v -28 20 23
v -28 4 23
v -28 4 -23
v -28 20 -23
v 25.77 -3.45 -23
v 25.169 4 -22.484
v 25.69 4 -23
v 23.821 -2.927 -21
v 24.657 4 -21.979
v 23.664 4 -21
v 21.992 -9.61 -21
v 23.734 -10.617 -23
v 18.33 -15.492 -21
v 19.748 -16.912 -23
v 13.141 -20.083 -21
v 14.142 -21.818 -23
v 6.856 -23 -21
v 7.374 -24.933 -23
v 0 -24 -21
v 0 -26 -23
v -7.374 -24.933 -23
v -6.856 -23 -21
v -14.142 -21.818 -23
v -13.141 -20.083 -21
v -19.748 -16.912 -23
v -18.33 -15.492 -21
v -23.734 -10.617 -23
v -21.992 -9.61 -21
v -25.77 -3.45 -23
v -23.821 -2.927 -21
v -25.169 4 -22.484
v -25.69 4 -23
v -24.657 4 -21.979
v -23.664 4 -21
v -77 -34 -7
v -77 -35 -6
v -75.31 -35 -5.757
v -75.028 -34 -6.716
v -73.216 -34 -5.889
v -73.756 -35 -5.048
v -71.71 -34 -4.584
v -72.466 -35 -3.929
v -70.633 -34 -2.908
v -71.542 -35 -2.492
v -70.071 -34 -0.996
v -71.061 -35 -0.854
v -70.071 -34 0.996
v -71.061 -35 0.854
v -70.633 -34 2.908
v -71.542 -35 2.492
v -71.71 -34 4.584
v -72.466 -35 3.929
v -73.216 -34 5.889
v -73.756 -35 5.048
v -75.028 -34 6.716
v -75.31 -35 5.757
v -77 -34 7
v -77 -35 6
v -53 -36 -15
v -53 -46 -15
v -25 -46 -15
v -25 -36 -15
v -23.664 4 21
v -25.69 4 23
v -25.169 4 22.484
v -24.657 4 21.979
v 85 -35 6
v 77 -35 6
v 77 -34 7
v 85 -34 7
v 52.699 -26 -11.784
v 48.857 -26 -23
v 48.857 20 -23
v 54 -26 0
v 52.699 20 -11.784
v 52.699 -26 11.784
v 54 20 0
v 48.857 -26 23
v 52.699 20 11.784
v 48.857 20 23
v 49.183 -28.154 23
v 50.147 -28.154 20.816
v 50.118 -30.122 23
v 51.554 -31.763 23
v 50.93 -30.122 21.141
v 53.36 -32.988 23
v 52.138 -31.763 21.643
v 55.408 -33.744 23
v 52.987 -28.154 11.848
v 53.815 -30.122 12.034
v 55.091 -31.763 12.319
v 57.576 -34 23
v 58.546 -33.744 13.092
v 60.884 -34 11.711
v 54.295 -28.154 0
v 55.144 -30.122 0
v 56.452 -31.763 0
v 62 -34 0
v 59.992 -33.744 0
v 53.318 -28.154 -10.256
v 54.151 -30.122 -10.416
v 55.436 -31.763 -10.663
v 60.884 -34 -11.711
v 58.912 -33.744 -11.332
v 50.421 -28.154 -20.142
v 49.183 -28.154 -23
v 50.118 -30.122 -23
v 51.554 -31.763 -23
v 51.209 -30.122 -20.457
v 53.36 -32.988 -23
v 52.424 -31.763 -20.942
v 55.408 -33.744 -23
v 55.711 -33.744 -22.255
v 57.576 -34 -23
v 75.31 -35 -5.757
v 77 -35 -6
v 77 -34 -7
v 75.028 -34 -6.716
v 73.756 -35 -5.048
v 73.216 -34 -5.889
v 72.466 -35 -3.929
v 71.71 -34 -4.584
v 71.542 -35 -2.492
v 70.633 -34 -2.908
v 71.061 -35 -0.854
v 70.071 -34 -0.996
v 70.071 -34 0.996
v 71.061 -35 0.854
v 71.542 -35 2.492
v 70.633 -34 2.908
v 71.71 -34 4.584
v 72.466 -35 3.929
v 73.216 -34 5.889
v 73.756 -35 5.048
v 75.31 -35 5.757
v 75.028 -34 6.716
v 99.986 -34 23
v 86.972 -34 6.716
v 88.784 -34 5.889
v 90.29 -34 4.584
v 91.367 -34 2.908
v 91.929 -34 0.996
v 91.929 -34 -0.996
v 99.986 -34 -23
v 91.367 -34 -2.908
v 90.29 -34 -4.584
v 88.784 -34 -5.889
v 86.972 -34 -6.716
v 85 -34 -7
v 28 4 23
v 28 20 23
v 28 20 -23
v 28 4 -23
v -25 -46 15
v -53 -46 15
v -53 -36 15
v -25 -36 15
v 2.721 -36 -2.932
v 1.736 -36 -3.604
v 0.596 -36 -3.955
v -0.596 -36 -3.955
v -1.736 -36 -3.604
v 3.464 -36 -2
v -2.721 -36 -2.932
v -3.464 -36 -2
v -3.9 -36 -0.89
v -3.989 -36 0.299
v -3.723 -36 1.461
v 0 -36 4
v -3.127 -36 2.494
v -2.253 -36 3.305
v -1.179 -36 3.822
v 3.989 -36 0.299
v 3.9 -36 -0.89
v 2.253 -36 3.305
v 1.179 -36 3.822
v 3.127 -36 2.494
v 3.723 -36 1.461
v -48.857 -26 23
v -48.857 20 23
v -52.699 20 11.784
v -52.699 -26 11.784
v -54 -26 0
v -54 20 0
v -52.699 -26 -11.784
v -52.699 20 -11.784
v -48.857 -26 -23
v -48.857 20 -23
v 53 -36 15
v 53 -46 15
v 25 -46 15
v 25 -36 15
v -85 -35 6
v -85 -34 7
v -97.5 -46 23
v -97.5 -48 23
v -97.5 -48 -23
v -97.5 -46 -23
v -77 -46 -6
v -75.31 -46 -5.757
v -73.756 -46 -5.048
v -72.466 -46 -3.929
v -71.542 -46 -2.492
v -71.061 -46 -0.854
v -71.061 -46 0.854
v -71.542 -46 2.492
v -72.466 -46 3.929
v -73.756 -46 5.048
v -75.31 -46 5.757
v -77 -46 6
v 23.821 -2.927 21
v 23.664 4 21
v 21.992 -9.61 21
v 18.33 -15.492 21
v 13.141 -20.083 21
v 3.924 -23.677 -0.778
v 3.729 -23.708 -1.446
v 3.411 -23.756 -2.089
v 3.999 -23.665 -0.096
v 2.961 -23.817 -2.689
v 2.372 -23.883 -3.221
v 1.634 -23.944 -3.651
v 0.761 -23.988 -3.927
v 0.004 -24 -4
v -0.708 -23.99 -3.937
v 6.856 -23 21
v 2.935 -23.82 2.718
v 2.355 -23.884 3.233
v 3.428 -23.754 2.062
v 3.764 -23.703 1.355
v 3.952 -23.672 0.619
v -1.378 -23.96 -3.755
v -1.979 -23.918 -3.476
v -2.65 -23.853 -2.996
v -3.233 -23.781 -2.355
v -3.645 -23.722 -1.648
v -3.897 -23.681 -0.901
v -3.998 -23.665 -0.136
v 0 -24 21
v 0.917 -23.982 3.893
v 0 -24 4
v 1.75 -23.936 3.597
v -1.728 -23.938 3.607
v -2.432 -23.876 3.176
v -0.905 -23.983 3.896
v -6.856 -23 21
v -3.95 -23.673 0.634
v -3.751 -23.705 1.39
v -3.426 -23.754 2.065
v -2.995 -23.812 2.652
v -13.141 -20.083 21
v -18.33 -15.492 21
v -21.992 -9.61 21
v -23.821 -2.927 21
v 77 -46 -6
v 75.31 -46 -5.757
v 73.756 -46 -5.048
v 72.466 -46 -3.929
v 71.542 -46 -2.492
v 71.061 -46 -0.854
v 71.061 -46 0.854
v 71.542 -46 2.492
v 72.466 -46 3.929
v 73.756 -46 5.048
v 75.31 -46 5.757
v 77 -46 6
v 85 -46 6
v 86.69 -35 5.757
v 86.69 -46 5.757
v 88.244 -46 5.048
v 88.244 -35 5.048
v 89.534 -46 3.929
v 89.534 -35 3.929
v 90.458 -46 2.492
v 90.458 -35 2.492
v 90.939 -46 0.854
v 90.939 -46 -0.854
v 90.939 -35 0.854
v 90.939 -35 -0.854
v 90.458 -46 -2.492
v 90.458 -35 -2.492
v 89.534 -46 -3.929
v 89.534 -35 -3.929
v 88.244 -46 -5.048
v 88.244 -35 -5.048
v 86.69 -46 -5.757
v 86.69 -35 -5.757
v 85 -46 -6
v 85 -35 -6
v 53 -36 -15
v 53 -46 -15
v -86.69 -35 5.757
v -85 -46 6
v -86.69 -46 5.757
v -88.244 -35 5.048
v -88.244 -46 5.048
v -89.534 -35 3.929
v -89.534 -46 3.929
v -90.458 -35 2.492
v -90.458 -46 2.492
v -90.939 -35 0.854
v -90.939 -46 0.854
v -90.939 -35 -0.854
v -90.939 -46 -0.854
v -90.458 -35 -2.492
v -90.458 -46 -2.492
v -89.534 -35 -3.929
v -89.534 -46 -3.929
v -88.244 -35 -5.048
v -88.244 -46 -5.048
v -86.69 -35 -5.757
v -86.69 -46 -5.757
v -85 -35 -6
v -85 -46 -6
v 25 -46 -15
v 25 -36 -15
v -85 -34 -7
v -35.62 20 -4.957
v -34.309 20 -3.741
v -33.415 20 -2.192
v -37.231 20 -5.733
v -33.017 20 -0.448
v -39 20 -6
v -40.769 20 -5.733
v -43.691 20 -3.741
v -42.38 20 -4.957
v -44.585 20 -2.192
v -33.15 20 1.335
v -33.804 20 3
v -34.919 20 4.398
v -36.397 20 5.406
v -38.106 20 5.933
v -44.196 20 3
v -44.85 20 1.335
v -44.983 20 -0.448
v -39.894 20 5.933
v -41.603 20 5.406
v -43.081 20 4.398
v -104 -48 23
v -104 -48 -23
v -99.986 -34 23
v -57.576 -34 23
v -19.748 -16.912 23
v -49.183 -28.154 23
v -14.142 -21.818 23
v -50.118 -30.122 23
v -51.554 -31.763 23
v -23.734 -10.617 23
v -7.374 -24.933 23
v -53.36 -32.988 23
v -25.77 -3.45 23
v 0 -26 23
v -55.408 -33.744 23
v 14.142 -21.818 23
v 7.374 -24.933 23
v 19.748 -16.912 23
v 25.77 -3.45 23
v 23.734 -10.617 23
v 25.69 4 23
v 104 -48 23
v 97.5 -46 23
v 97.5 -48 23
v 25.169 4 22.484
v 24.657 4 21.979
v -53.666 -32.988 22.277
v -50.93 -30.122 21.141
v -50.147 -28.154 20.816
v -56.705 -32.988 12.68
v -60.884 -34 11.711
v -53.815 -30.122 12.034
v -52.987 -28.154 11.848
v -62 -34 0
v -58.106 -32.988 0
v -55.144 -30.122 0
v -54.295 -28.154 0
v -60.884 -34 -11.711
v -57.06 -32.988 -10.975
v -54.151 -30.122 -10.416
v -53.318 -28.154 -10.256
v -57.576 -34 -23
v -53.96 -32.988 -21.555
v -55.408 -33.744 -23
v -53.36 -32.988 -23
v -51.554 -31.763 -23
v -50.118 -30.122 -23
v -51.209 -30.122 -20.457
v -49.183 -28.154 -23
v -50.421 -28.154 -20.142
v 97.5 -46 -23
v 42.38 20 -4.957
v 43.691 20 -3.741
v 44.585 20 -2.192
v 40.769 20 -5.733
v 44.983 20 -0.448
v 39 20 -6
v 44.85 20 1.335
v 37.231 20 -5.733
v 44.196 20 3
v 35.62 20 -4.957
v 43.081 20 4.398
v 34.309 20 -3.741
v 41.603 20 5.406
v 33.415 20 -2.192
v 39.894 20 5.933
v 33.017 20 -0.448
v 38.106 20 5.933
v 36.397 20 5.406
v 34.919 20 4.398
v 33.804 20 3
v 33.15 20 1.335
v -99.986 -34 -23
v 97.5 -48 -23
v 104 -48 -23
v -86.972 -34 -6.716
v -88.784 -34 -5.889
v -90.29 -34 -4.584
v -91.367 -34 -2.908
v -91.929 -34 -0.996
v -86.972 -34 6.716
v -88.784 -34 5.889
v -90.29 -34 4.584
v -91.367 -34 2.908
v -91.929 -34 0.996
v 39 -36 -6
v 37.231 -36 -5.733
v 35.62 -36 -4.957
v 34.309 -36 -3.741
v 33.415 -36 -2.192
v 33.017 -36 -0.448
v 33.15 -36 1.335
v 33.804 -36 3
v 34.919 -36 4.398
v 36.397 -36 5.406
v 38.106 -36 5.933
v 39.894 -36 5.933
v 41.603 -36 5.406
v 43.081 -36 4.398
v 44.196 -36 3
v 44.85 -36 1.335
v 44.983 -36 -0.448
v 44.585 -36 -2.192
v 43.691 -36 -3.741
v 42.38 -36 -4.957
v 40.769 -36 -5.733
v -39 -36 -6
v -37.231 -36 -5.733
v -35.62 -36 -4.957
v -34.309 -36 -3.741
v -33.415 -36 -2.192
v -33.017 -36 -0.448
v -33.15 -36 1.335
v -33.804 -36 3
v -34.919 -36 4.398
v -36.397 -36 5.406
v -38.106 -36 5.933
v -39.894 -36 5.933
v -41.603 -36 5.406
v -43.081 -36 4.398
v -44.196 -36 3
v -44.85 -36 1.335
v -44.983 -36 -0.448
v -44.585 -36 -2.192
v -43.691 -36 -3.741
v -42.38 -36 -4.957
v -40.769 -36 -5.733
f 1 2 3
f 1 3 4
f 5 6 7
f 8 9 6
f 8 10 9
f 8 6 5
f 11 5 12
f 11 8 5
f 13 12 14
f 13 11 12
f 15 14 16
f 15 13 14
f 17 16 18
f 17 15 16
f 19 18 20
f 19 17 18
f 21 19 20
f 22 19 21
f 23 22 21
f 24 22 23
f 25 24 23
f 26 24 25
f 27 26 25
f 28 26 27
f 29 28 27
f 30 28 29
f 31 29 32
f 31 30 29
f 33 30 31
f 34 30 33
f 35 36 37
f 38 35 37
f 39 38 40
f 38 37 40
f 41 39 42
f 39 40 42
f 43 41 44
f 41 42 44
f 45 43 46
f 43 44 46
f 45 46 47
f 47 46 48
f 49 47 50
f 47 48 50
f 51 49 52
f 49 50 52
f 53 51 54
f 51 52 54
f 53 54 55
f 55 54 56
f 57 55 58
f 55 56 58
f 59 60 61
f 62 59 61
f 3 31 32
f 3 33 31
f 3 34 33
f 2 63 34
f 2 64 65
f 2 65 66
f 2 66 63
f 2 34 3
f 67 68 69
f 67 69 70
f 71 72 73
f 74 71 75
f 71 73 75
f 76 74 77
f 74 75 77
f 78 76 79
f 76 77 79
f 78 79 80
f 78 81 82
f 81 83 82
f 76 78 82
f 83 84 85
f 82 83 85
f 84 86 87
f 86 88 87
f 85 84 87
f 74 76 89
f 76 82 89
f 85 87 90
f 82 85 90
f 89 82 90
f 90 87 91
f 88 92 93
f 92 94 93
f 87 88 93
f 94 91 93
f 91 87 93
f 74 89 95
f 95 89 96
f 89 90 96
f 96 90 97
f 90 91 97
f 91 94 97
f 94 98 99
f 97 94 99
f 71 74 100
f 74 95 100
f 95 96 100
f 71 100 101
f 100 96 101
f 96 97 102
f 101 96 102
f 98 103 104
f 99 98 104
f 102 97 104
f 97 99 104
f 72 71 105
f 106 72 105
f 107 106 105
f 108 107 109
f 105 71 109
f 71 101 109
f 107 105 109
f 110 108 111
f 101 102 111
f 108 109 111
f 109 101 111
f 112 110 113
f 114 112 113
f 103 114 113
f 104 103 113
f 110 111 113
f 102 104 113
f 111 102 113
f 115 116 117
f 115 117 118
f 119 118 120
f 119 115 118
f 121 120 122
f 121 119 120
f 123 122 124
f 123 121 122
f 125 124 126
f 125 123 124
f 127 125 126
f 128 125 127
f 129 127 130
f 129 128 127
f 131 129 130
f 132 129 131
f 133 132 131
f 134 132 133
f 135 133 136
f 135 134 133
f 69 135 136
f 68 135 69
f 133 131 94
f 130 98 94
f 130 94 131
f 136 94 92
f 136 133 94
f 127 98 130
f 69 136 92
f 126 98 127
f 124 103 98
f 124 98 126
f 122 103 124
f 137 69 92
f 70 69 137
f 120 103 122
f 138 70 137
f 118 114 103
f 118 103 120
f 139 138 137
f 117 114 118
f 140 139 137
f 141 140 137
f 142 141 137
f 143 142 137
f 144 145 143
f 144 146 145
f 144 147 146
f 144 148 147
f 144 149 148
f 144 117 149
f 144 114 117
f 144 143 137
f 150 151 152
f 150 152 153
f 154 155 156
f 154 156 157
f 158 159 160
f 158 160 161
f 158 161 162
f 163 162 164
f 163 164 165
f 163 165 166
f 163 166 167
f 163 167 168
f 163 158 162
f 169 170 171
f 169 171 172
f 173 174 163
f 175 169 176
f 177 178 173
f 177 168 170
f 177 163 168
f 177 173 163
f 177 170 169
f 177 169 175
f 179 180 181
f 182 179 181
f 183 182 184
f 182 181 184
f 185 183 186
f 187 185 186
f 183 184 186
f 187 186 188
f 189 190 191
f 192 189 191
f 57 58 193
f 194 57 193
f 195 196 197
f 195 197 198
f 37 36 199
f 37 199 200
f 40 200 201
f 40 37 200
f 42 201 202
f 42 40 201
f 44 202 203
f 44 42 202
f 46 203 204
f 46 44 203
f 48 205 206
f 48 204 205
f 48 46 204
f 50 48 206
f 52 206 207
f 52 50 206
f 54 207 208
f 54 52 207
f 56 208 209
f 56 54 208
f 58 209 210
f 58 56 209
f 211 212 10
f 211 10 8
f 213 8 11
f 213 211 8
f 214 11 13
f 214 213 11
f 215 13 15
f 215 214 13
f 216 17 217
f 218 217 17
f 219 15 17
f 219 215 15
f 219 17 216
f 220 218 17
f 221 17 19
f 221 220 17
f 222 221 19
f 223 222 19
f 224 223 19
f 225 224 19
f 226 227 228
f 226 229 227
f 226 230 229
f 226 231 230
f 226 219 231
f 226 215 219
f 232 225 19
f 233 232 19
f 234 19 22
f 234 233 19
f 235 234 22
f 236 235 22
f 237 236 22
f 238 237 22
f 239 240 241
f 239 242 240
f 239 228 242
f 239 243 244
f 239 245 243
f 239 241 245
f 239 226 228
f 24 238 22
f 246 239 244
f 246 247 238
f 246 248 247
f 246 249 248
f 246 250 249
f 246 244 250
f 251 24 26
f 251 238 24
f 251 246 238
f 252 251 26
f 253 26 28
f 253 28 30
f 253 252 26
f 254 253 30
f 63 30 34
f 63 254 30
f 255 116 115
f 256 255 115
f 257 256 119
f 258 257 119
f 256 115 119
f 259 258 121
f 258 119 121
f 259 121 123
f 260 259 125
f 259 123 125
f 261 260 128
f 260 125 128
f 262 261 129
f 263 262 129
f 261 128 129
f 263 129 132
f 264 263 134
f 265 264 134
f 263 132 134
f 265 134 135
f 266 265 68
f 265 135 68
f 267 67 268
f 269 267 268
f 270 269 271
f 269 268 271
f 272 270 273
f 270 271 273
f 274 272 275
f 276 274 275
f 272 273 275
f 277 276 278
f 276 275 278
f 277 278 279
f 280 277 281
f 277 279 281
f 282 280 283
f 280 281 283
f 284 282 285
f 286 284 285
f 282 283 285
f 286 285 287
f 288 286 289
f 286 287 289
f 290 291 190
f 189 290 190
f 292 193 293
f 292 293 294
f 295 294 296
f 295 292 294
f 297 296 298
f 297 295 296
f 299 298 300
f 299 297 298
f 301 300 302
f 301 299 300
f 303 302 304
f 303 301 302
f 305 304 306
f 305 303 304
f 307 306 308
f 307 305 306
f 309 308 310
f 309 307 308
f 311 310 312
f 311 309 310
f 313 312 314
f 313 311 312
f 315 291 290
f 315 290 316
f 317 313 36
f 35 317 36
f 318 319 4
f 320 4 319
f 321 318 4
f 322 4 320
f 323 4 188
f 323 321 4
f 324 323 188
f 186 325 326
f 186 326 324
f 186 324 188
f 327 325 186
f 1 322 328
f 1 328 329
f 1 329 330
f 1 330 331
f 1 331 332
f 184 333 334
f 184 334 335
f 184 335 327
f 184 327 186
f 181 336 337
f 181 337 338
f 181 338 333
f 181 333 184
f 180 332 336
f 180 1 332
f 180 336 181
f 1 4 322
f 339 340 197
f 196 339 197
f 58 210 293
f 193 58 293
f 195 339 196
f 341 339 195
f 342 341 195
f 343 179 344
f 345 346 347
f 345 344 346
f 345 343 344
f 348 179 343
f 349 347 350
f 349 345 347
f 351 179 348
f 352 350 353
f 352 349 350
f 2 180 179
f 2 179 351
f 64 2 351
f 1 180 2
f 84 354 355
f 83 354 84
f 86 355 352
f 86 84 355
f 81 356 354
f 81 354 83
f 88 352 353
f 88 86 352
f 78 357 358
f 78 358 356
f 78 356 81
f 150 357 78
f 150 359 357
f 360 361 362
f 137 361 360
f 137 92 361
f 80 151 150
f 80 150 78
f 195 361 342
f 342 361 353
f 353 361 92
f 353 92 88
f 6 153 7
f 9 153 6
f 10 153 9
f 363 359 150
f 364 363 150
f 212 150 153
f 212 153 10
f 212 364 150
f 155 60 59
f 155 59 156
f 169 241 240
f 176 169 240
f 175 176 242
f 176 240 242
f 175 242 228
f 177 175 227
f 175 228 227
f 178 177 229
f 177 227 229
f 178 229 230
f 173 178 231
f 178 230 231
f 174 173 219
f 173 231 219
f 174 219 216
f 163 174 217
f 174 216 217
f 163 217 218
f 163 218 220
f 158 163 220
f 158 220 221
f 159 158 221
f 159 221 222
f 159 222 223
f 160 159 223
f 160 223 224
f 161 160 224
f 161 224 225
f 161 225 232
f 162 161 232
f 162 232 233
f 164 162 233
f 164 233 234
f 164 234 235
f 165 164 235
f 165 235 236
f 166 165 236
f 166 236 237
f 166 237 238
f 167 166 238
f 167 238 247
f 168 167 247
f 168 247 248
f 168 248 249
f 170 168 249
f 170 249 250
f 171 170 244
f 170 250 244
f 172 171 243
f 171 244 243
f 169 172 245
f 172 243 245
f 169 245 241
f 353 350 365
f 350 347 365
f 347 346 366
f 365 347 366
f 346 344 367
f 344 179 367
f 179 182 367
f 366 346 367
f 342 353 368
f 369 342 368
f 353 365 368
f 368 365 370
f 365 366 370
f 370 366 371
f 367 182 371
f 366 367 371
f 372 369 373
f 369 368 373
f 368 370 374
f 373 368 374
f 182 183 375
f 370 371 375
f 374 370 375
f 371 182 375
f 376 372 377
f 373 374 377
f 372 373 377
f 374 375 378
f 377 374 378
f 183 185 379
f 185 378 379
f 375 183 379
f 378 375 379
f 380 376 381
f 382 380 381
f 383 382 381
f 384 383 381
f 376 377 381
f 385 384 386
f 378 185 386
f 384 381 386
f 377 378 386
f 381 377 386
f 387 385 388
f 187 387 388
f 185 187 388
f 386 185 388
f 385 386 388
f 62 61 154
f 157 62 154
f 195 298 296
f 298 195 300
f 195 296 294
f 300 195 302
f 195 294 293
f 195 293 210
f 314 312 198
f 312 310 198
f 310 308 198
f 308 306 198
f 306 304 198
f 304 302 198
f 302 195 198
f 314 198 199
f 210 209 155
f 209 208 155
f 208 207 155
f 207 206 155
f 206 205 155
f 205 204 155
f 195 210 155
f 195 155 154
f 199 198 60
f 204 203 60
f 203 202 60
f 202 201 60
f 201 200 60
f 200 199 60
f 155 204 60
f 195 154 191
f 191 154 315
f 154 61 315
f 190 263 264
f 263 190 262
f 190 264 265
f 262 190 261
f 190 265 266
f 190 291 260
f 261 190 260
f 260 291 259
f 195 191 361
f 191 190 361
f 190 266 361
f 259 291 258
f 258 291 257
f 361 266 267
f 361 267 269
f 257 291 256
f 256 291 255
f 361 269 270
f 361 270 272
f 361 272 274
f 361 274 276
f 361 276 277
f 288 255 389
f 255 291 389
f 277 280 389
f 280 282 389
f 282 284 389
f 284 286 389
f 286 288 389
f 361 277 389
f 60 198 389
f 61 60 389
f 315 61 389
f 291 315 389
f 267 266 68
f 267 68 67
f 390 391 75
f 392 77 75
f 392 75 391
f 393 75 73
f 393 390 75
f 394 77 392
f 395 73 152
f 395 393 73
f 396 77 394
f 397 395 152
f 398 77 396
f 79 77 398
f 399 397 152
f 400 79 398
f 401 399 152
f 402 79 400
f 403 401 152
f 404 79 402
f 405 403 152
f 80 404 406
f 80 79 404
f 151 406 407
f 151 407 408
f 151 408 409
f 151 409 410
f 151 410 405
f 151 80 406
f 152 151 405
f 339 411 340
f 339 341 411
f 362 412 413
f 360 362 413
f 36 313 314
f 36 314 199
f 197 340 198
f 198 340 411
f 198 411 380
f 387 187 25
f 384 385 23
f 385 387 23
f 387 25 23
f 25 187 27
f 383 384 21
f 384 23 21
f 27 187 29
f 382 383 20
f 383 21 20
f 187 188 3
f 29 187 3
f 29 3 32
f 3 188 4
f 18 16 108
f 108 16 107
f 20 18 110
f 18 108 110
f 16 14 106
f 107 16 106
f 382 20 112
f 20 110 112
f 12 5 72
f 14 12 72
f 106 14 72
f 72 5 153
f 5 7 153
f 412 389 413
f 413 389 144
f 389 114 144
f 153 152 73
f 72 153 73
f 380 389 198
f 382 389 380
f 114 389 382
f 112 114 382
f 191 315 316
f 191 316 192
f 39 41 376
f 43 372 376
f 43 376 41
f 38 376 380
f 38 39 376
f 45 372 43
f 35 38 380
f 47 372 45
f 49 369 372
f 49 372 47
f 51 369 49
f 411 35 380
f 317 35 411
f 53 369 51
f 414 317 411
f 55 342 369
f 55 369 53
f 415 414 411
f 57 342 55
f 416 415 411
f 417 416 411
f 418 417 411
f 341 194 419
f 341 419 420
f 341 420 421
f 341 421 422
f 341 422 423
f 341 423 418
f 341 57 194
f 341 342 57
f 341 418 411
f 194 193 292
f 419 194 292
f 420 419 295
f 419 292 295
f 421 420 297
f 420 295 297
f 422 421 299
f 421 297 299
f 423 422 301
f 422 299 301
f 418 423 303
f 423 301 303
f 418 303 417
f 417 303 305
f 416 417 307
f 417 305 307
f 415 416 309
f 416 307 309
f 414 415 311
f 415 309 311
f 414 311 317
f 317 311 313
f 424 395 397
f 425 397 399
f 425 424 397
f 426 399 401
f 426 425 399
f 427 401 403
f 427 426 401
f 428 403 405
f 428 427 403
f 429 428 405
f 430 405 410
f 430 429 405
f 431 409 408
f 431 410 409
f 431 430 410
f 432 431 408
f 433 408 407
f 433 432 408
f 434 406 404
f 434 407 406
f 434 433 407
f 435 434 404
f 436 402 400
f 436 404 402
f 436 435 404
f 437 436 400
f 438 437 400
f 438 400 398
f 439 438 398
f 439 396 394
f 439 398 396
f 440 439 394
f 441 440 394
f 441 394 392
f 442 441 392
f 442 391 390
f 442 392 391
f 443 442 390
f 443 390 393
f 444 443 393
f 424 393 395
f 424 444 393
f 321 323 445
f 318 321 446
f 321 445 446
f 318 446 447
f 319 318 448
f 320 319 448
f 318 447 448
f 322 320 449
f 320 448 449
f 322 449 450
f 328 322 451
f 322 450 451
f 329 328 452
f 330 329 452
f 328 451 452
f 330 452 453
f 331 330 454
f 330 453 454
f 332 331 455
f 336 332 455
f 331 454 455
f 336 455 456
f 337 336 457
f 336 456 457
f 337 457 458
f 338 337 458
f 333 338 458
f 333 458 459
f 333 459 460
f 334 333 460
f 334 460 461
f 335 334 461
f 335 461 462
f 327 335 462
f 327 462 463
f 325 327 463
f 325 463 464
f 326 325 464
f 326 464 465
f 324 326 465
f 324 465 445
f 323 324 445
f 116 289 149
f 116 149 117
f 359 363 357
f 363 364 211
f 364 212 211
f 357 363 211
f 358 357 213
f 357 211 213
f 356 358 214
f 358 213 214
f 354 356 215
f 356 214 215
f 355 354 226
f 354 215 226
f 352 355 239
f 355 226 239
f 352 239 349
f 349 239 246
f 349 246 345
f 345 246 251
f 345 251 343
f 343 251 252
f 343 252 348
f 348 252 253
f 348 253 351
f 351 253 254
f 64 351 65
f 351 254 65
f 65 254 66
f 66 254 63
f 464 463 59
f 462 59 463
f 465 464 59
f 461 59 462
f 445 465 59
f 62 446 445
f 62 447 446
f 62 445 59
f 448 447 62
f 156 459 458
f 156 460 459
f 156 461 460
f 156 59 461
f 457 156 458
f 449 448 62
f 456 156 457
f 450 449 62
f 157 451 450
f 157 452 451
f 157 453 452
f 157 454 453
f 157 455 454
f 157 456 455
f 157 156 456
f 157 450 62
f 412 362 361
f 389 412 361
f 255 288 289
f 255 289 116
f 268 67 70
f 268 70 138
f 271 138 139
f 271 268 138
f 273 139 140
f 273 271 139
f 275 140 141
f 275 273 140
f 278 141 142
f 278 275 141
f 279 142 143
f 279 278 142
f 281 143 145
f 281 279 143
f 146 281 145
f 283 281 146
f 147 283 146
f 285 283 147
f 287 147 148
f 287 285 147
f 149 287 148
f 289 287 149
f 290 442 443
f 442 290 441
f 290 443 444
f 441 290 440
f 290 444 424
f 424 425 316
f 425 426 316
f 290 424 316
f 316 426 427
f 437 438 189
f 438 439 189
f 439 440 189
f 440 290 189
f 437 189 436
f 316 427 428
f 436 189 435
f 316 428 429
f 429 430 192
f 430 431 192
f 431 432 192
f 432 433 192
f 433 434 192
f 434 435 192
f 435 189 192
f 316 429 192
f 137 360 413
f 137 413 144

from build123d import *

# Parameters (mm, degrees)
BOSS_EXTRUDE1_DEPTH     = 23
CUT_EXTRUDE5_DEPTH      = 54
FILLET1_R               = 8
CHAMFER1_SIZE           = 2
CUT_EXTRUDE2_DEPTH      = 117.82893492196186
CUT_EXTRUDE2_DEPTH_BACK = 117.82893492196186
SKETCH4_W               = 195
SKETCH4_H               = 2
CUT_EXTRUDE6_DEPTH      = 120.41942905658195
SKETCH5_W               = 28.000000000000004
SKETCH5_H               = 30
SKETCH5_R               = 6.000000000000002
CUT_EXTRUDE3_DEPTH      = 10
SKETCH5_2_R             = 6.000000000000002
CUT_EXTRUDE7_DEPTH      = 126.30363138632497
CHAMFER2_SIZE           = 1
SKETCH9_R               = 4
CUT_EXTRUDE8_DEPTH      = 36


with BuildPart() as part:
    # Sketch1 → Boss-Extrude1 (new, symmetric)
    with BuildSketch(Plane.XY):
        with BuildLine():
            Line((-104, -48), (104, -48))
            Line((104, -48), (99.98556459937663, -34))
            Line((99.98556459937663, -34), (54.00000000000001, -34.00000000000001))
            Line((54.00000000000001, -34.00000000000001), (54.00000000000001, 20))
            Line((54.00000000000001, 20), (28.000000000000004, 20))
            Line((28.000000000000004, 20), (28, 4))
            Line((28, 4), (23.664319132398468, 4))
            ThreePointArc((23.664319132398468, 4), (1.47e-15, -24.000000000000004), (-23.664319132398465, 4))
            Line((-23.664319132398465, 4), (-28, 4))
            Line((-28, 4), (-28, 20))
            Line((-28, 20), (-54.00000000000001, 20))
            Line((-54.00000000000001, 20), (-54.00000000000001, -34.00000000000001))
            Line((-54.00000000000001, -34.00000000000001), (-99.98556459937662, -33.99999999999999))
            Line((-99.98556459937662, -33.99999999999999), (-104, -48))
        make_face()
    extrude(amount=BOSS_EXTRUDE1_DEPTH, both=True)

    # Sketch7 → Cut-Extrude5 (cut)
    with BuildSketch(Plane(origin=(0, 20, 0), x_dir=(1, 2.9e-16, 0), z_dir=(-2.9e-16, 1, 0))):
        with BuildLine():
            Line((-54.00000000000001, 23), (-54.00000000000001, 4.0501e-13))
            ThreePointArc((-54.000000000000014, 4.0856e-13), (-52.69855043578576, 11.784005344828431), (-48.856934001224445, 23))
            Line((-48.85693400122444, 23), (-54.00000000000001, 23))
        make_face()
        with BuildLine():
            Line((-54.00000000000001, 4.0501e-13), (-54.00000000000001, -23))
            Line((-54.00000000000001, -23), (-48.85693400122444, -23))
            ThreePointArc((-48.856934001224445, -23.000000000000004), (-52.69855043578586, -11.784005344828039), (-54.000000000000014, 4.0856e-13))
        make_face()
        with BuildLine():
            ThreePointArc((48.85693400122443, 23.000000000000004), (52.69855043578579, 11.784005344828252), (54, 3.286e-14))
            Line((54.00000000000001, 3.553e-14), (54.00000000000001, 23))
            Line((54.00000000000001, 23), (48.856934001224424, 23))
        make_face()
        with BuildLine():
            Line((48.856934001224424, -23), (54.00000000000001, -23))
            Line((54.00000000000001, -23), (54.00000000000001, 3.553e-14))
            ThreePointArc((54, 3.286e-14), (52.698550435785805, -11.784005344828213), (48.85693400122443, -23))
        make_face()
    extrude(amount=-CUT_EXTRUDE5_DEPTH, mode=Mode.SUBTRACT)

    # Fillet1
    fillet1_edges = [part.edges().sort_by_distance(p)[0] for p in [
        (-54.000000000000014, -34.000000000000014, -4.4e-16),
        (54.00000000000001, -33.999999999999986, 4.44e-15),
    ]]
    fillet(fillet1_edges, radius=FILLET1_R)

    # Chamfer1
    chamfer1_edges = [part.edges().sort_by_distance(p)[0] for p in [
        (-4.44e-15, -24.000000000000007, -23),
        (-4.44e-15, -24.000000000000007, 23),
    ]]
    chamfer(chamfer1_edges, length=CHAMFER1_SIZE)

    # Sketch4 → Cut-Extrude2 (cut, two sides: drawn at the far end of the back side and taken through both)
    with BuildSketch(Plane.XY.offset(-CUT_EXTRUDE2_DEPTH_BACK)):
        with Locations((0, -47)):
            Rectangle(SKETCH4_W, SKETCH4_H)
    extrude(amount=CUT_EXTRUDE2_DEPTH + CUT_EXTRUDE2_DEPTH_BACK, mode=Mode.SUBTRACT)

    # Sketch8 → Cut-Extrude6 (cut, through all)
    with BuildSketch(Plane(origin=(-1.026e-14, -34.00000000000002, 0), x_dir=(1, -3e-16, 0), z_dir=(3e-16, 1, 0))):
        with BuildLine():
            Line((-85, 6), (-77, 6))
            ThreePointArc((-77, 6), (-71, 0), (-77, -6))
            Line((-77, -6), (-85, -6))
            ThreePointArc((-85, -6), (-91, 7.3e-16), (-85, 6))
        make_face()
    cut_extrude6 = extrude(amount=-CUT_EXTRUDE6_DEPTH, mode=Mode.SUBTRACT)

    # Sketch5 → Cut-Extrude3 (cut)
    with BuildSketch(Plane.XZ.offset(46)):
        with Locations((-39.00000000000001, -1.78e-15)):
            Rectangle(SKETCH5_W, SKETCH5_H)
        with Locations(Location((-38.99999999999999, -3.47e-15, 0), (0, 0, 270))):
            Circle(SKETCH5_R, mode=Mode.SUBTRACT)
    cut_extrude3 = extrude(amount=-CUT_EXTRUDE3_DEPTH, mode=Mode.SUBTRACT)

    # Sketch5<2> → Cut-Extrude7 (cut, through all)
    with BuildSketch(Plane.XZ.offset(46)):
        with Locations(Location((-38.99999999999999, -3.47e-15, 0), (0, 0, 270))):
            Circle(SKETCH5_2_R)
    cut_extrude7 = extrude(amount=-CUT_EXTRUDE7_DEPTH, mode=Mode.SUBTRACT)

    # Mirror5: Cut-Extrude6, Cut-Extrude3, Cut-Extrude7 across plane
    add(cut_extrude6.mirror(Plane(origin=(0, 0, 0), x_dir=(0, 0, 1), z_dir=(1, 0, 0))), mode=Mode.SUBTRACT)
    add(cut_extrude3.mirror(Plane(origin=(0, 0, 0), x_dir=(0, 0, 1), z_dir=(1, 0, 0))), mode=Mode.SUBTRACT)
    add(cut_extrude7.mirror(Plane(origin=(0, 0, 0), x_dir=(0, 0, 1), z_dir=(1, 0, 0))), mode=Mode.SUBTRACT)

    # Chamfer2
    chamfer2_edges = [part.edges().sort_by_distance(p)[0] for p in [
        (-91.00000000000001, -33.99999999999999, 3.7e-16),
        (-81.00000000000001, -34, 6),
        (-71.00000000000001, -34, -3.7e-16),
        (-81.00000000000001, -34, -6),
        (91, -33.99999999999999, 3.7e-16),
        (81, -34, 6),
        (71, -34, -3.7e-16),
        (81, -34, -6),
    ]]
    chamfer(chamfer2_edges, length=CHAMFER2_SIZE)

    # Sketch9 → Cut-Extrude8 (cut)
    with BuildSketch(Plane(origin=(0, 0, 0), x_dir=(1, 0, 0), z_dir=(0, 1, 0))):
        with Locations(Location((0, 0, 0), (0, 0, 270))):
            Circle(SKETCH9_R)
    extrude(amount=-CUT_EXTRUDE8_DEPTH, mode=Mode.SUBTRACT)


solid = part.part
